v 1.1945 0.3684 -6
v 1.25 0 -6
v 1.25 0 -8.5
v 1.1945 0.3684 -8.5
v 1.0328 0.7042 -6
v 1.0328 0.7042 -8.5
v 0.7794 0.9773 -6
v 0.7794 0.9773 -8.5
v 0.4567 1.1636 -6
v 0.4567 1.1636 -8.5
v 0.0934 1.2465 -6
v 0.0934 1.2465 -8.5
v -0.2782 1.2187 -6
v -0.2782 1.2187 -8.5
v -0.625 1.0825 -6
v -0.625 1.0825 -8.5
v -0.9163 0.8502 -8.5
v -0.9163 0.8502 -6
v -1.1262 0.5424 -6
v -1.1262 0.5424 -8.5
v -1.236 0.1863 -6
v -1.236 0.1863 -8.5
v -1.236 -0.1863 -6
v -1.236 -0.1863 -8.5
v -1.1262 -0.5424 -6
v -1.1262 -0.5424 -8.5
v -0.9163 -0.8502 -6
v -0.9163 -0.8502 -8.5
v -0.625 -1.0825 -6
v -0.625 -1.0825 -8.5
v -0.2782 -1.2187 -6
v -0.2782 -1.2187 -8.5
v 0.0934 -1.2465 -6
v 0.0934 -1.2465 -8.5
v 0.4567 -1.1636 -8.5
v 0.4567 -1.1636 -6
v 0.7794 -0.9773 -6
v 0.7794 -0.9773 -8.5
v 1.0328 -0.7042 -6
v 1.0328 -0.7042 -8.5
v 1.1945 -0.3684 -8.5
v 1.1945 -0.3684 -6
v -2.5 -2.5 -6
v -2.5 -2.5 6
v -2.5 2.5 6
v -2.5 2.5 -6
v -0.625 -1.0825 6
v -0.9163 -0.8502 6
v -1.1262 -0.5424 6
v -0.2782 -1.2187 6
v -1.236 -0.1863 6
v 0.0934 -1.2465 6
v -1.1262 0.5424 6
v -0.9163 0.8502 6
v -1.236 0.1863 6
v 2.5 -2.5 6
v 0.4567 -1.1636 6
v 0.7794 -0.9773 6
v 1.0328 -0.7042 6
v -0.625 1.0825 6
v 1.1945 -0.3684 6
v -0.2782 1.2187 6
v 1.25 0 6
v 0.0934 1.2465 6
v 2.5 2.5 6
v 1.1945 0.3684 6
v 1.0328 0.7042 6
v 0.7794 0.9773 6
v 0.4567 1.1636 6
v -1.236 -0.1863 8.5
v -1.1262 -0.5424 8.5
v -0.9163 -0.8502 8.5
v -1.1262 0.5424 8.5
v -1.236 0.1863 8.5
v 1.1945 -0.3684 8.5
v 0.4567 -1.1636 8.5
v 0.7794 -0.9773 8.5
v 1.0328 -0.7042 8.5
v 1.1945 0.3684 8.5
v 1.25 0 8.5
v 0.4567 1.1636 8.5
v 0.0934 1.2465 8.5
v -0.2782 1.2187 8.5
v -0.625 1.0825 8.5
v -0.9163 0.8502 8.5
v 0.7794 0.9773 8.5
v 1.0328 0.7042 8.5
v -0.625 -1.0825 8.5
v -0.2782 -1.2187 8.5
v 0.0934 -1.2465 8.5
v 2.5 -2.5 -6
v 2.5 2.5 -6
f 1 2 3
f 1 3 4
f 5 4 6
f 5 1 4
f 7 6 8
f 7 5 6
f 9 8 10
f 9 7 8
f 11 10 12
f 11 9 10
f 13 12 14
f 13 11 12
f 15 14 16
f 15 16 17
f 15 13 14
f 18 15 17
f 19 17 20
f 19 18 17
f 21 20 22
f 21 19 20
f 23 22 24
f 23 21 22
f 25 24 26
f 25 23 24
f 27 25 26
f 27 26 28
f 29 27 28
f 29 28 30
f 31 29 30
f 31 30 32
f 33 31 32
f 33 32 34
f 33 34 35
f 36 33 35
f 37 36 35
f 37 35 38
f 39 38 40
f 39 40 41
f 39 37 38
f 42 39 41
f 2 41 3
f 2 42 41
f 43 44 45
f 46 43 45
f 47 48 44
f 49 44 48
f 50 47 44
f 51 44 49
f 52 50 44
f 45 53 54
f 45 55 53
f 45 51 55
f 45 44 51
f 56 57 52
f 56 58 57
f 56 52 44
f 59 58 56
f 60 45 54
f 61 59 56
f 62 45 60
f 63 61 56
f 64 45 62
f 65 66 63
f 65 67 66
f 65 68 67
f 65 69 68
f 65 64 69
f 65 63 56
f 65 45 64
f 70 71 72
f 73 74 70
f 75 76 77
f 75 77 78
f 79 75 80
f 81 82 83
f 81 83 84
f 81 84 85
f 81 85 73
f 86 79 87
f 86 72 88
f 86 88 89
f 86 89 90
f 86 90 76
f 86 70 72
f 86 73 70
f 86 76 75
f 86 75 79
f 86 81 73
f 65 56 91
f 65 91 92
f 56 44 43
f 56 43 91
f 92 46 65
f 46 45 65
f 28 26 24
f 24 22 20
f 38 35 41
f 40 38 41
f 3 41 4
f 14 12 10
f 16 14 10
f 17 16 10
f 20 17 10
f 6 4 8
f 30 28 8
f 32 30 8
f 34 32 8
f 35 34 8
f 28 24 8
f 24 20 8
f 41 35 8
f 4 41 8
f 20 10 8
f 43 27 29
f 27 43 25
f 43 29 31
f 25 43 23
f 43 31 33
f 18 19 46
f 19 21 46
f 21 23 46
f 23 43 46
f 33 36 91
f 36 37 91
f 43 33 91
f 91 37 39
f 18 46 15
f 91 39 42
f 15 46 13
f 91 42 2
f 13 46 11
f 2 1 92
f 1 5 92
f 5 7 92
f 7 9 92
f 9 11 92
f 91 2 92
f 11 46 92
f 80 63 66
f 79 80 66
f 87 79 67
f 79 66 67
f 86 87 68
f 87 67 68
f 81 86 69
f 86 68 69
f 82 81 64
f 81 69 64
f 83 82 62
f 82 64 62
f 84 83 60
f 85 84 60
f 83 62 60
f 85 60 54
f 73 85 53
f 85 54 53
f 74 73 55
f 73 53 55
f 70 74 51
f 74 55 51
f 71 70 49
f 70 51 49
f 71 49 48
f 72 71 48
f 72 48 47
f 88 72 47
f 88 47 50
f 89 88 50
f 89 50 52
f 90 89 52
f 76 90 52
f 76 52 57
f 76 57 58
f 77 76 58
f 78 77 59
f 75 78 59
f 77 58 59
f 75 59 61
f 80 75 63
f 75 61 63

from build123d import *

# Parameters (mm, degrees)
F0_W     = 5
F0_H     = 5
F1_DEPTH = 6
F2_R     = 1.25
F3_DEPTH = 2.5


with BuildPart() as f1:
    # F0 (on Top) → F1 (new body, symmetric)
    with BuildSketch(Plane.XY):
        Rectangle(F0_W, F0_H)
    extrude(amount=F1_DEPTH, both=True)

    # F2 (on face) → F3 (join)
    with BuildSketch(Plane.XY.offset(6)):
        Circle(F2_R)
    extrude(amount=F3_DEPTH)

    # F4: F1 across plane


with BuildPart() as f1_1:
    add(f1.part)
    add(f1.part.mirror(Plane.XY))


solid = f1_1.part
